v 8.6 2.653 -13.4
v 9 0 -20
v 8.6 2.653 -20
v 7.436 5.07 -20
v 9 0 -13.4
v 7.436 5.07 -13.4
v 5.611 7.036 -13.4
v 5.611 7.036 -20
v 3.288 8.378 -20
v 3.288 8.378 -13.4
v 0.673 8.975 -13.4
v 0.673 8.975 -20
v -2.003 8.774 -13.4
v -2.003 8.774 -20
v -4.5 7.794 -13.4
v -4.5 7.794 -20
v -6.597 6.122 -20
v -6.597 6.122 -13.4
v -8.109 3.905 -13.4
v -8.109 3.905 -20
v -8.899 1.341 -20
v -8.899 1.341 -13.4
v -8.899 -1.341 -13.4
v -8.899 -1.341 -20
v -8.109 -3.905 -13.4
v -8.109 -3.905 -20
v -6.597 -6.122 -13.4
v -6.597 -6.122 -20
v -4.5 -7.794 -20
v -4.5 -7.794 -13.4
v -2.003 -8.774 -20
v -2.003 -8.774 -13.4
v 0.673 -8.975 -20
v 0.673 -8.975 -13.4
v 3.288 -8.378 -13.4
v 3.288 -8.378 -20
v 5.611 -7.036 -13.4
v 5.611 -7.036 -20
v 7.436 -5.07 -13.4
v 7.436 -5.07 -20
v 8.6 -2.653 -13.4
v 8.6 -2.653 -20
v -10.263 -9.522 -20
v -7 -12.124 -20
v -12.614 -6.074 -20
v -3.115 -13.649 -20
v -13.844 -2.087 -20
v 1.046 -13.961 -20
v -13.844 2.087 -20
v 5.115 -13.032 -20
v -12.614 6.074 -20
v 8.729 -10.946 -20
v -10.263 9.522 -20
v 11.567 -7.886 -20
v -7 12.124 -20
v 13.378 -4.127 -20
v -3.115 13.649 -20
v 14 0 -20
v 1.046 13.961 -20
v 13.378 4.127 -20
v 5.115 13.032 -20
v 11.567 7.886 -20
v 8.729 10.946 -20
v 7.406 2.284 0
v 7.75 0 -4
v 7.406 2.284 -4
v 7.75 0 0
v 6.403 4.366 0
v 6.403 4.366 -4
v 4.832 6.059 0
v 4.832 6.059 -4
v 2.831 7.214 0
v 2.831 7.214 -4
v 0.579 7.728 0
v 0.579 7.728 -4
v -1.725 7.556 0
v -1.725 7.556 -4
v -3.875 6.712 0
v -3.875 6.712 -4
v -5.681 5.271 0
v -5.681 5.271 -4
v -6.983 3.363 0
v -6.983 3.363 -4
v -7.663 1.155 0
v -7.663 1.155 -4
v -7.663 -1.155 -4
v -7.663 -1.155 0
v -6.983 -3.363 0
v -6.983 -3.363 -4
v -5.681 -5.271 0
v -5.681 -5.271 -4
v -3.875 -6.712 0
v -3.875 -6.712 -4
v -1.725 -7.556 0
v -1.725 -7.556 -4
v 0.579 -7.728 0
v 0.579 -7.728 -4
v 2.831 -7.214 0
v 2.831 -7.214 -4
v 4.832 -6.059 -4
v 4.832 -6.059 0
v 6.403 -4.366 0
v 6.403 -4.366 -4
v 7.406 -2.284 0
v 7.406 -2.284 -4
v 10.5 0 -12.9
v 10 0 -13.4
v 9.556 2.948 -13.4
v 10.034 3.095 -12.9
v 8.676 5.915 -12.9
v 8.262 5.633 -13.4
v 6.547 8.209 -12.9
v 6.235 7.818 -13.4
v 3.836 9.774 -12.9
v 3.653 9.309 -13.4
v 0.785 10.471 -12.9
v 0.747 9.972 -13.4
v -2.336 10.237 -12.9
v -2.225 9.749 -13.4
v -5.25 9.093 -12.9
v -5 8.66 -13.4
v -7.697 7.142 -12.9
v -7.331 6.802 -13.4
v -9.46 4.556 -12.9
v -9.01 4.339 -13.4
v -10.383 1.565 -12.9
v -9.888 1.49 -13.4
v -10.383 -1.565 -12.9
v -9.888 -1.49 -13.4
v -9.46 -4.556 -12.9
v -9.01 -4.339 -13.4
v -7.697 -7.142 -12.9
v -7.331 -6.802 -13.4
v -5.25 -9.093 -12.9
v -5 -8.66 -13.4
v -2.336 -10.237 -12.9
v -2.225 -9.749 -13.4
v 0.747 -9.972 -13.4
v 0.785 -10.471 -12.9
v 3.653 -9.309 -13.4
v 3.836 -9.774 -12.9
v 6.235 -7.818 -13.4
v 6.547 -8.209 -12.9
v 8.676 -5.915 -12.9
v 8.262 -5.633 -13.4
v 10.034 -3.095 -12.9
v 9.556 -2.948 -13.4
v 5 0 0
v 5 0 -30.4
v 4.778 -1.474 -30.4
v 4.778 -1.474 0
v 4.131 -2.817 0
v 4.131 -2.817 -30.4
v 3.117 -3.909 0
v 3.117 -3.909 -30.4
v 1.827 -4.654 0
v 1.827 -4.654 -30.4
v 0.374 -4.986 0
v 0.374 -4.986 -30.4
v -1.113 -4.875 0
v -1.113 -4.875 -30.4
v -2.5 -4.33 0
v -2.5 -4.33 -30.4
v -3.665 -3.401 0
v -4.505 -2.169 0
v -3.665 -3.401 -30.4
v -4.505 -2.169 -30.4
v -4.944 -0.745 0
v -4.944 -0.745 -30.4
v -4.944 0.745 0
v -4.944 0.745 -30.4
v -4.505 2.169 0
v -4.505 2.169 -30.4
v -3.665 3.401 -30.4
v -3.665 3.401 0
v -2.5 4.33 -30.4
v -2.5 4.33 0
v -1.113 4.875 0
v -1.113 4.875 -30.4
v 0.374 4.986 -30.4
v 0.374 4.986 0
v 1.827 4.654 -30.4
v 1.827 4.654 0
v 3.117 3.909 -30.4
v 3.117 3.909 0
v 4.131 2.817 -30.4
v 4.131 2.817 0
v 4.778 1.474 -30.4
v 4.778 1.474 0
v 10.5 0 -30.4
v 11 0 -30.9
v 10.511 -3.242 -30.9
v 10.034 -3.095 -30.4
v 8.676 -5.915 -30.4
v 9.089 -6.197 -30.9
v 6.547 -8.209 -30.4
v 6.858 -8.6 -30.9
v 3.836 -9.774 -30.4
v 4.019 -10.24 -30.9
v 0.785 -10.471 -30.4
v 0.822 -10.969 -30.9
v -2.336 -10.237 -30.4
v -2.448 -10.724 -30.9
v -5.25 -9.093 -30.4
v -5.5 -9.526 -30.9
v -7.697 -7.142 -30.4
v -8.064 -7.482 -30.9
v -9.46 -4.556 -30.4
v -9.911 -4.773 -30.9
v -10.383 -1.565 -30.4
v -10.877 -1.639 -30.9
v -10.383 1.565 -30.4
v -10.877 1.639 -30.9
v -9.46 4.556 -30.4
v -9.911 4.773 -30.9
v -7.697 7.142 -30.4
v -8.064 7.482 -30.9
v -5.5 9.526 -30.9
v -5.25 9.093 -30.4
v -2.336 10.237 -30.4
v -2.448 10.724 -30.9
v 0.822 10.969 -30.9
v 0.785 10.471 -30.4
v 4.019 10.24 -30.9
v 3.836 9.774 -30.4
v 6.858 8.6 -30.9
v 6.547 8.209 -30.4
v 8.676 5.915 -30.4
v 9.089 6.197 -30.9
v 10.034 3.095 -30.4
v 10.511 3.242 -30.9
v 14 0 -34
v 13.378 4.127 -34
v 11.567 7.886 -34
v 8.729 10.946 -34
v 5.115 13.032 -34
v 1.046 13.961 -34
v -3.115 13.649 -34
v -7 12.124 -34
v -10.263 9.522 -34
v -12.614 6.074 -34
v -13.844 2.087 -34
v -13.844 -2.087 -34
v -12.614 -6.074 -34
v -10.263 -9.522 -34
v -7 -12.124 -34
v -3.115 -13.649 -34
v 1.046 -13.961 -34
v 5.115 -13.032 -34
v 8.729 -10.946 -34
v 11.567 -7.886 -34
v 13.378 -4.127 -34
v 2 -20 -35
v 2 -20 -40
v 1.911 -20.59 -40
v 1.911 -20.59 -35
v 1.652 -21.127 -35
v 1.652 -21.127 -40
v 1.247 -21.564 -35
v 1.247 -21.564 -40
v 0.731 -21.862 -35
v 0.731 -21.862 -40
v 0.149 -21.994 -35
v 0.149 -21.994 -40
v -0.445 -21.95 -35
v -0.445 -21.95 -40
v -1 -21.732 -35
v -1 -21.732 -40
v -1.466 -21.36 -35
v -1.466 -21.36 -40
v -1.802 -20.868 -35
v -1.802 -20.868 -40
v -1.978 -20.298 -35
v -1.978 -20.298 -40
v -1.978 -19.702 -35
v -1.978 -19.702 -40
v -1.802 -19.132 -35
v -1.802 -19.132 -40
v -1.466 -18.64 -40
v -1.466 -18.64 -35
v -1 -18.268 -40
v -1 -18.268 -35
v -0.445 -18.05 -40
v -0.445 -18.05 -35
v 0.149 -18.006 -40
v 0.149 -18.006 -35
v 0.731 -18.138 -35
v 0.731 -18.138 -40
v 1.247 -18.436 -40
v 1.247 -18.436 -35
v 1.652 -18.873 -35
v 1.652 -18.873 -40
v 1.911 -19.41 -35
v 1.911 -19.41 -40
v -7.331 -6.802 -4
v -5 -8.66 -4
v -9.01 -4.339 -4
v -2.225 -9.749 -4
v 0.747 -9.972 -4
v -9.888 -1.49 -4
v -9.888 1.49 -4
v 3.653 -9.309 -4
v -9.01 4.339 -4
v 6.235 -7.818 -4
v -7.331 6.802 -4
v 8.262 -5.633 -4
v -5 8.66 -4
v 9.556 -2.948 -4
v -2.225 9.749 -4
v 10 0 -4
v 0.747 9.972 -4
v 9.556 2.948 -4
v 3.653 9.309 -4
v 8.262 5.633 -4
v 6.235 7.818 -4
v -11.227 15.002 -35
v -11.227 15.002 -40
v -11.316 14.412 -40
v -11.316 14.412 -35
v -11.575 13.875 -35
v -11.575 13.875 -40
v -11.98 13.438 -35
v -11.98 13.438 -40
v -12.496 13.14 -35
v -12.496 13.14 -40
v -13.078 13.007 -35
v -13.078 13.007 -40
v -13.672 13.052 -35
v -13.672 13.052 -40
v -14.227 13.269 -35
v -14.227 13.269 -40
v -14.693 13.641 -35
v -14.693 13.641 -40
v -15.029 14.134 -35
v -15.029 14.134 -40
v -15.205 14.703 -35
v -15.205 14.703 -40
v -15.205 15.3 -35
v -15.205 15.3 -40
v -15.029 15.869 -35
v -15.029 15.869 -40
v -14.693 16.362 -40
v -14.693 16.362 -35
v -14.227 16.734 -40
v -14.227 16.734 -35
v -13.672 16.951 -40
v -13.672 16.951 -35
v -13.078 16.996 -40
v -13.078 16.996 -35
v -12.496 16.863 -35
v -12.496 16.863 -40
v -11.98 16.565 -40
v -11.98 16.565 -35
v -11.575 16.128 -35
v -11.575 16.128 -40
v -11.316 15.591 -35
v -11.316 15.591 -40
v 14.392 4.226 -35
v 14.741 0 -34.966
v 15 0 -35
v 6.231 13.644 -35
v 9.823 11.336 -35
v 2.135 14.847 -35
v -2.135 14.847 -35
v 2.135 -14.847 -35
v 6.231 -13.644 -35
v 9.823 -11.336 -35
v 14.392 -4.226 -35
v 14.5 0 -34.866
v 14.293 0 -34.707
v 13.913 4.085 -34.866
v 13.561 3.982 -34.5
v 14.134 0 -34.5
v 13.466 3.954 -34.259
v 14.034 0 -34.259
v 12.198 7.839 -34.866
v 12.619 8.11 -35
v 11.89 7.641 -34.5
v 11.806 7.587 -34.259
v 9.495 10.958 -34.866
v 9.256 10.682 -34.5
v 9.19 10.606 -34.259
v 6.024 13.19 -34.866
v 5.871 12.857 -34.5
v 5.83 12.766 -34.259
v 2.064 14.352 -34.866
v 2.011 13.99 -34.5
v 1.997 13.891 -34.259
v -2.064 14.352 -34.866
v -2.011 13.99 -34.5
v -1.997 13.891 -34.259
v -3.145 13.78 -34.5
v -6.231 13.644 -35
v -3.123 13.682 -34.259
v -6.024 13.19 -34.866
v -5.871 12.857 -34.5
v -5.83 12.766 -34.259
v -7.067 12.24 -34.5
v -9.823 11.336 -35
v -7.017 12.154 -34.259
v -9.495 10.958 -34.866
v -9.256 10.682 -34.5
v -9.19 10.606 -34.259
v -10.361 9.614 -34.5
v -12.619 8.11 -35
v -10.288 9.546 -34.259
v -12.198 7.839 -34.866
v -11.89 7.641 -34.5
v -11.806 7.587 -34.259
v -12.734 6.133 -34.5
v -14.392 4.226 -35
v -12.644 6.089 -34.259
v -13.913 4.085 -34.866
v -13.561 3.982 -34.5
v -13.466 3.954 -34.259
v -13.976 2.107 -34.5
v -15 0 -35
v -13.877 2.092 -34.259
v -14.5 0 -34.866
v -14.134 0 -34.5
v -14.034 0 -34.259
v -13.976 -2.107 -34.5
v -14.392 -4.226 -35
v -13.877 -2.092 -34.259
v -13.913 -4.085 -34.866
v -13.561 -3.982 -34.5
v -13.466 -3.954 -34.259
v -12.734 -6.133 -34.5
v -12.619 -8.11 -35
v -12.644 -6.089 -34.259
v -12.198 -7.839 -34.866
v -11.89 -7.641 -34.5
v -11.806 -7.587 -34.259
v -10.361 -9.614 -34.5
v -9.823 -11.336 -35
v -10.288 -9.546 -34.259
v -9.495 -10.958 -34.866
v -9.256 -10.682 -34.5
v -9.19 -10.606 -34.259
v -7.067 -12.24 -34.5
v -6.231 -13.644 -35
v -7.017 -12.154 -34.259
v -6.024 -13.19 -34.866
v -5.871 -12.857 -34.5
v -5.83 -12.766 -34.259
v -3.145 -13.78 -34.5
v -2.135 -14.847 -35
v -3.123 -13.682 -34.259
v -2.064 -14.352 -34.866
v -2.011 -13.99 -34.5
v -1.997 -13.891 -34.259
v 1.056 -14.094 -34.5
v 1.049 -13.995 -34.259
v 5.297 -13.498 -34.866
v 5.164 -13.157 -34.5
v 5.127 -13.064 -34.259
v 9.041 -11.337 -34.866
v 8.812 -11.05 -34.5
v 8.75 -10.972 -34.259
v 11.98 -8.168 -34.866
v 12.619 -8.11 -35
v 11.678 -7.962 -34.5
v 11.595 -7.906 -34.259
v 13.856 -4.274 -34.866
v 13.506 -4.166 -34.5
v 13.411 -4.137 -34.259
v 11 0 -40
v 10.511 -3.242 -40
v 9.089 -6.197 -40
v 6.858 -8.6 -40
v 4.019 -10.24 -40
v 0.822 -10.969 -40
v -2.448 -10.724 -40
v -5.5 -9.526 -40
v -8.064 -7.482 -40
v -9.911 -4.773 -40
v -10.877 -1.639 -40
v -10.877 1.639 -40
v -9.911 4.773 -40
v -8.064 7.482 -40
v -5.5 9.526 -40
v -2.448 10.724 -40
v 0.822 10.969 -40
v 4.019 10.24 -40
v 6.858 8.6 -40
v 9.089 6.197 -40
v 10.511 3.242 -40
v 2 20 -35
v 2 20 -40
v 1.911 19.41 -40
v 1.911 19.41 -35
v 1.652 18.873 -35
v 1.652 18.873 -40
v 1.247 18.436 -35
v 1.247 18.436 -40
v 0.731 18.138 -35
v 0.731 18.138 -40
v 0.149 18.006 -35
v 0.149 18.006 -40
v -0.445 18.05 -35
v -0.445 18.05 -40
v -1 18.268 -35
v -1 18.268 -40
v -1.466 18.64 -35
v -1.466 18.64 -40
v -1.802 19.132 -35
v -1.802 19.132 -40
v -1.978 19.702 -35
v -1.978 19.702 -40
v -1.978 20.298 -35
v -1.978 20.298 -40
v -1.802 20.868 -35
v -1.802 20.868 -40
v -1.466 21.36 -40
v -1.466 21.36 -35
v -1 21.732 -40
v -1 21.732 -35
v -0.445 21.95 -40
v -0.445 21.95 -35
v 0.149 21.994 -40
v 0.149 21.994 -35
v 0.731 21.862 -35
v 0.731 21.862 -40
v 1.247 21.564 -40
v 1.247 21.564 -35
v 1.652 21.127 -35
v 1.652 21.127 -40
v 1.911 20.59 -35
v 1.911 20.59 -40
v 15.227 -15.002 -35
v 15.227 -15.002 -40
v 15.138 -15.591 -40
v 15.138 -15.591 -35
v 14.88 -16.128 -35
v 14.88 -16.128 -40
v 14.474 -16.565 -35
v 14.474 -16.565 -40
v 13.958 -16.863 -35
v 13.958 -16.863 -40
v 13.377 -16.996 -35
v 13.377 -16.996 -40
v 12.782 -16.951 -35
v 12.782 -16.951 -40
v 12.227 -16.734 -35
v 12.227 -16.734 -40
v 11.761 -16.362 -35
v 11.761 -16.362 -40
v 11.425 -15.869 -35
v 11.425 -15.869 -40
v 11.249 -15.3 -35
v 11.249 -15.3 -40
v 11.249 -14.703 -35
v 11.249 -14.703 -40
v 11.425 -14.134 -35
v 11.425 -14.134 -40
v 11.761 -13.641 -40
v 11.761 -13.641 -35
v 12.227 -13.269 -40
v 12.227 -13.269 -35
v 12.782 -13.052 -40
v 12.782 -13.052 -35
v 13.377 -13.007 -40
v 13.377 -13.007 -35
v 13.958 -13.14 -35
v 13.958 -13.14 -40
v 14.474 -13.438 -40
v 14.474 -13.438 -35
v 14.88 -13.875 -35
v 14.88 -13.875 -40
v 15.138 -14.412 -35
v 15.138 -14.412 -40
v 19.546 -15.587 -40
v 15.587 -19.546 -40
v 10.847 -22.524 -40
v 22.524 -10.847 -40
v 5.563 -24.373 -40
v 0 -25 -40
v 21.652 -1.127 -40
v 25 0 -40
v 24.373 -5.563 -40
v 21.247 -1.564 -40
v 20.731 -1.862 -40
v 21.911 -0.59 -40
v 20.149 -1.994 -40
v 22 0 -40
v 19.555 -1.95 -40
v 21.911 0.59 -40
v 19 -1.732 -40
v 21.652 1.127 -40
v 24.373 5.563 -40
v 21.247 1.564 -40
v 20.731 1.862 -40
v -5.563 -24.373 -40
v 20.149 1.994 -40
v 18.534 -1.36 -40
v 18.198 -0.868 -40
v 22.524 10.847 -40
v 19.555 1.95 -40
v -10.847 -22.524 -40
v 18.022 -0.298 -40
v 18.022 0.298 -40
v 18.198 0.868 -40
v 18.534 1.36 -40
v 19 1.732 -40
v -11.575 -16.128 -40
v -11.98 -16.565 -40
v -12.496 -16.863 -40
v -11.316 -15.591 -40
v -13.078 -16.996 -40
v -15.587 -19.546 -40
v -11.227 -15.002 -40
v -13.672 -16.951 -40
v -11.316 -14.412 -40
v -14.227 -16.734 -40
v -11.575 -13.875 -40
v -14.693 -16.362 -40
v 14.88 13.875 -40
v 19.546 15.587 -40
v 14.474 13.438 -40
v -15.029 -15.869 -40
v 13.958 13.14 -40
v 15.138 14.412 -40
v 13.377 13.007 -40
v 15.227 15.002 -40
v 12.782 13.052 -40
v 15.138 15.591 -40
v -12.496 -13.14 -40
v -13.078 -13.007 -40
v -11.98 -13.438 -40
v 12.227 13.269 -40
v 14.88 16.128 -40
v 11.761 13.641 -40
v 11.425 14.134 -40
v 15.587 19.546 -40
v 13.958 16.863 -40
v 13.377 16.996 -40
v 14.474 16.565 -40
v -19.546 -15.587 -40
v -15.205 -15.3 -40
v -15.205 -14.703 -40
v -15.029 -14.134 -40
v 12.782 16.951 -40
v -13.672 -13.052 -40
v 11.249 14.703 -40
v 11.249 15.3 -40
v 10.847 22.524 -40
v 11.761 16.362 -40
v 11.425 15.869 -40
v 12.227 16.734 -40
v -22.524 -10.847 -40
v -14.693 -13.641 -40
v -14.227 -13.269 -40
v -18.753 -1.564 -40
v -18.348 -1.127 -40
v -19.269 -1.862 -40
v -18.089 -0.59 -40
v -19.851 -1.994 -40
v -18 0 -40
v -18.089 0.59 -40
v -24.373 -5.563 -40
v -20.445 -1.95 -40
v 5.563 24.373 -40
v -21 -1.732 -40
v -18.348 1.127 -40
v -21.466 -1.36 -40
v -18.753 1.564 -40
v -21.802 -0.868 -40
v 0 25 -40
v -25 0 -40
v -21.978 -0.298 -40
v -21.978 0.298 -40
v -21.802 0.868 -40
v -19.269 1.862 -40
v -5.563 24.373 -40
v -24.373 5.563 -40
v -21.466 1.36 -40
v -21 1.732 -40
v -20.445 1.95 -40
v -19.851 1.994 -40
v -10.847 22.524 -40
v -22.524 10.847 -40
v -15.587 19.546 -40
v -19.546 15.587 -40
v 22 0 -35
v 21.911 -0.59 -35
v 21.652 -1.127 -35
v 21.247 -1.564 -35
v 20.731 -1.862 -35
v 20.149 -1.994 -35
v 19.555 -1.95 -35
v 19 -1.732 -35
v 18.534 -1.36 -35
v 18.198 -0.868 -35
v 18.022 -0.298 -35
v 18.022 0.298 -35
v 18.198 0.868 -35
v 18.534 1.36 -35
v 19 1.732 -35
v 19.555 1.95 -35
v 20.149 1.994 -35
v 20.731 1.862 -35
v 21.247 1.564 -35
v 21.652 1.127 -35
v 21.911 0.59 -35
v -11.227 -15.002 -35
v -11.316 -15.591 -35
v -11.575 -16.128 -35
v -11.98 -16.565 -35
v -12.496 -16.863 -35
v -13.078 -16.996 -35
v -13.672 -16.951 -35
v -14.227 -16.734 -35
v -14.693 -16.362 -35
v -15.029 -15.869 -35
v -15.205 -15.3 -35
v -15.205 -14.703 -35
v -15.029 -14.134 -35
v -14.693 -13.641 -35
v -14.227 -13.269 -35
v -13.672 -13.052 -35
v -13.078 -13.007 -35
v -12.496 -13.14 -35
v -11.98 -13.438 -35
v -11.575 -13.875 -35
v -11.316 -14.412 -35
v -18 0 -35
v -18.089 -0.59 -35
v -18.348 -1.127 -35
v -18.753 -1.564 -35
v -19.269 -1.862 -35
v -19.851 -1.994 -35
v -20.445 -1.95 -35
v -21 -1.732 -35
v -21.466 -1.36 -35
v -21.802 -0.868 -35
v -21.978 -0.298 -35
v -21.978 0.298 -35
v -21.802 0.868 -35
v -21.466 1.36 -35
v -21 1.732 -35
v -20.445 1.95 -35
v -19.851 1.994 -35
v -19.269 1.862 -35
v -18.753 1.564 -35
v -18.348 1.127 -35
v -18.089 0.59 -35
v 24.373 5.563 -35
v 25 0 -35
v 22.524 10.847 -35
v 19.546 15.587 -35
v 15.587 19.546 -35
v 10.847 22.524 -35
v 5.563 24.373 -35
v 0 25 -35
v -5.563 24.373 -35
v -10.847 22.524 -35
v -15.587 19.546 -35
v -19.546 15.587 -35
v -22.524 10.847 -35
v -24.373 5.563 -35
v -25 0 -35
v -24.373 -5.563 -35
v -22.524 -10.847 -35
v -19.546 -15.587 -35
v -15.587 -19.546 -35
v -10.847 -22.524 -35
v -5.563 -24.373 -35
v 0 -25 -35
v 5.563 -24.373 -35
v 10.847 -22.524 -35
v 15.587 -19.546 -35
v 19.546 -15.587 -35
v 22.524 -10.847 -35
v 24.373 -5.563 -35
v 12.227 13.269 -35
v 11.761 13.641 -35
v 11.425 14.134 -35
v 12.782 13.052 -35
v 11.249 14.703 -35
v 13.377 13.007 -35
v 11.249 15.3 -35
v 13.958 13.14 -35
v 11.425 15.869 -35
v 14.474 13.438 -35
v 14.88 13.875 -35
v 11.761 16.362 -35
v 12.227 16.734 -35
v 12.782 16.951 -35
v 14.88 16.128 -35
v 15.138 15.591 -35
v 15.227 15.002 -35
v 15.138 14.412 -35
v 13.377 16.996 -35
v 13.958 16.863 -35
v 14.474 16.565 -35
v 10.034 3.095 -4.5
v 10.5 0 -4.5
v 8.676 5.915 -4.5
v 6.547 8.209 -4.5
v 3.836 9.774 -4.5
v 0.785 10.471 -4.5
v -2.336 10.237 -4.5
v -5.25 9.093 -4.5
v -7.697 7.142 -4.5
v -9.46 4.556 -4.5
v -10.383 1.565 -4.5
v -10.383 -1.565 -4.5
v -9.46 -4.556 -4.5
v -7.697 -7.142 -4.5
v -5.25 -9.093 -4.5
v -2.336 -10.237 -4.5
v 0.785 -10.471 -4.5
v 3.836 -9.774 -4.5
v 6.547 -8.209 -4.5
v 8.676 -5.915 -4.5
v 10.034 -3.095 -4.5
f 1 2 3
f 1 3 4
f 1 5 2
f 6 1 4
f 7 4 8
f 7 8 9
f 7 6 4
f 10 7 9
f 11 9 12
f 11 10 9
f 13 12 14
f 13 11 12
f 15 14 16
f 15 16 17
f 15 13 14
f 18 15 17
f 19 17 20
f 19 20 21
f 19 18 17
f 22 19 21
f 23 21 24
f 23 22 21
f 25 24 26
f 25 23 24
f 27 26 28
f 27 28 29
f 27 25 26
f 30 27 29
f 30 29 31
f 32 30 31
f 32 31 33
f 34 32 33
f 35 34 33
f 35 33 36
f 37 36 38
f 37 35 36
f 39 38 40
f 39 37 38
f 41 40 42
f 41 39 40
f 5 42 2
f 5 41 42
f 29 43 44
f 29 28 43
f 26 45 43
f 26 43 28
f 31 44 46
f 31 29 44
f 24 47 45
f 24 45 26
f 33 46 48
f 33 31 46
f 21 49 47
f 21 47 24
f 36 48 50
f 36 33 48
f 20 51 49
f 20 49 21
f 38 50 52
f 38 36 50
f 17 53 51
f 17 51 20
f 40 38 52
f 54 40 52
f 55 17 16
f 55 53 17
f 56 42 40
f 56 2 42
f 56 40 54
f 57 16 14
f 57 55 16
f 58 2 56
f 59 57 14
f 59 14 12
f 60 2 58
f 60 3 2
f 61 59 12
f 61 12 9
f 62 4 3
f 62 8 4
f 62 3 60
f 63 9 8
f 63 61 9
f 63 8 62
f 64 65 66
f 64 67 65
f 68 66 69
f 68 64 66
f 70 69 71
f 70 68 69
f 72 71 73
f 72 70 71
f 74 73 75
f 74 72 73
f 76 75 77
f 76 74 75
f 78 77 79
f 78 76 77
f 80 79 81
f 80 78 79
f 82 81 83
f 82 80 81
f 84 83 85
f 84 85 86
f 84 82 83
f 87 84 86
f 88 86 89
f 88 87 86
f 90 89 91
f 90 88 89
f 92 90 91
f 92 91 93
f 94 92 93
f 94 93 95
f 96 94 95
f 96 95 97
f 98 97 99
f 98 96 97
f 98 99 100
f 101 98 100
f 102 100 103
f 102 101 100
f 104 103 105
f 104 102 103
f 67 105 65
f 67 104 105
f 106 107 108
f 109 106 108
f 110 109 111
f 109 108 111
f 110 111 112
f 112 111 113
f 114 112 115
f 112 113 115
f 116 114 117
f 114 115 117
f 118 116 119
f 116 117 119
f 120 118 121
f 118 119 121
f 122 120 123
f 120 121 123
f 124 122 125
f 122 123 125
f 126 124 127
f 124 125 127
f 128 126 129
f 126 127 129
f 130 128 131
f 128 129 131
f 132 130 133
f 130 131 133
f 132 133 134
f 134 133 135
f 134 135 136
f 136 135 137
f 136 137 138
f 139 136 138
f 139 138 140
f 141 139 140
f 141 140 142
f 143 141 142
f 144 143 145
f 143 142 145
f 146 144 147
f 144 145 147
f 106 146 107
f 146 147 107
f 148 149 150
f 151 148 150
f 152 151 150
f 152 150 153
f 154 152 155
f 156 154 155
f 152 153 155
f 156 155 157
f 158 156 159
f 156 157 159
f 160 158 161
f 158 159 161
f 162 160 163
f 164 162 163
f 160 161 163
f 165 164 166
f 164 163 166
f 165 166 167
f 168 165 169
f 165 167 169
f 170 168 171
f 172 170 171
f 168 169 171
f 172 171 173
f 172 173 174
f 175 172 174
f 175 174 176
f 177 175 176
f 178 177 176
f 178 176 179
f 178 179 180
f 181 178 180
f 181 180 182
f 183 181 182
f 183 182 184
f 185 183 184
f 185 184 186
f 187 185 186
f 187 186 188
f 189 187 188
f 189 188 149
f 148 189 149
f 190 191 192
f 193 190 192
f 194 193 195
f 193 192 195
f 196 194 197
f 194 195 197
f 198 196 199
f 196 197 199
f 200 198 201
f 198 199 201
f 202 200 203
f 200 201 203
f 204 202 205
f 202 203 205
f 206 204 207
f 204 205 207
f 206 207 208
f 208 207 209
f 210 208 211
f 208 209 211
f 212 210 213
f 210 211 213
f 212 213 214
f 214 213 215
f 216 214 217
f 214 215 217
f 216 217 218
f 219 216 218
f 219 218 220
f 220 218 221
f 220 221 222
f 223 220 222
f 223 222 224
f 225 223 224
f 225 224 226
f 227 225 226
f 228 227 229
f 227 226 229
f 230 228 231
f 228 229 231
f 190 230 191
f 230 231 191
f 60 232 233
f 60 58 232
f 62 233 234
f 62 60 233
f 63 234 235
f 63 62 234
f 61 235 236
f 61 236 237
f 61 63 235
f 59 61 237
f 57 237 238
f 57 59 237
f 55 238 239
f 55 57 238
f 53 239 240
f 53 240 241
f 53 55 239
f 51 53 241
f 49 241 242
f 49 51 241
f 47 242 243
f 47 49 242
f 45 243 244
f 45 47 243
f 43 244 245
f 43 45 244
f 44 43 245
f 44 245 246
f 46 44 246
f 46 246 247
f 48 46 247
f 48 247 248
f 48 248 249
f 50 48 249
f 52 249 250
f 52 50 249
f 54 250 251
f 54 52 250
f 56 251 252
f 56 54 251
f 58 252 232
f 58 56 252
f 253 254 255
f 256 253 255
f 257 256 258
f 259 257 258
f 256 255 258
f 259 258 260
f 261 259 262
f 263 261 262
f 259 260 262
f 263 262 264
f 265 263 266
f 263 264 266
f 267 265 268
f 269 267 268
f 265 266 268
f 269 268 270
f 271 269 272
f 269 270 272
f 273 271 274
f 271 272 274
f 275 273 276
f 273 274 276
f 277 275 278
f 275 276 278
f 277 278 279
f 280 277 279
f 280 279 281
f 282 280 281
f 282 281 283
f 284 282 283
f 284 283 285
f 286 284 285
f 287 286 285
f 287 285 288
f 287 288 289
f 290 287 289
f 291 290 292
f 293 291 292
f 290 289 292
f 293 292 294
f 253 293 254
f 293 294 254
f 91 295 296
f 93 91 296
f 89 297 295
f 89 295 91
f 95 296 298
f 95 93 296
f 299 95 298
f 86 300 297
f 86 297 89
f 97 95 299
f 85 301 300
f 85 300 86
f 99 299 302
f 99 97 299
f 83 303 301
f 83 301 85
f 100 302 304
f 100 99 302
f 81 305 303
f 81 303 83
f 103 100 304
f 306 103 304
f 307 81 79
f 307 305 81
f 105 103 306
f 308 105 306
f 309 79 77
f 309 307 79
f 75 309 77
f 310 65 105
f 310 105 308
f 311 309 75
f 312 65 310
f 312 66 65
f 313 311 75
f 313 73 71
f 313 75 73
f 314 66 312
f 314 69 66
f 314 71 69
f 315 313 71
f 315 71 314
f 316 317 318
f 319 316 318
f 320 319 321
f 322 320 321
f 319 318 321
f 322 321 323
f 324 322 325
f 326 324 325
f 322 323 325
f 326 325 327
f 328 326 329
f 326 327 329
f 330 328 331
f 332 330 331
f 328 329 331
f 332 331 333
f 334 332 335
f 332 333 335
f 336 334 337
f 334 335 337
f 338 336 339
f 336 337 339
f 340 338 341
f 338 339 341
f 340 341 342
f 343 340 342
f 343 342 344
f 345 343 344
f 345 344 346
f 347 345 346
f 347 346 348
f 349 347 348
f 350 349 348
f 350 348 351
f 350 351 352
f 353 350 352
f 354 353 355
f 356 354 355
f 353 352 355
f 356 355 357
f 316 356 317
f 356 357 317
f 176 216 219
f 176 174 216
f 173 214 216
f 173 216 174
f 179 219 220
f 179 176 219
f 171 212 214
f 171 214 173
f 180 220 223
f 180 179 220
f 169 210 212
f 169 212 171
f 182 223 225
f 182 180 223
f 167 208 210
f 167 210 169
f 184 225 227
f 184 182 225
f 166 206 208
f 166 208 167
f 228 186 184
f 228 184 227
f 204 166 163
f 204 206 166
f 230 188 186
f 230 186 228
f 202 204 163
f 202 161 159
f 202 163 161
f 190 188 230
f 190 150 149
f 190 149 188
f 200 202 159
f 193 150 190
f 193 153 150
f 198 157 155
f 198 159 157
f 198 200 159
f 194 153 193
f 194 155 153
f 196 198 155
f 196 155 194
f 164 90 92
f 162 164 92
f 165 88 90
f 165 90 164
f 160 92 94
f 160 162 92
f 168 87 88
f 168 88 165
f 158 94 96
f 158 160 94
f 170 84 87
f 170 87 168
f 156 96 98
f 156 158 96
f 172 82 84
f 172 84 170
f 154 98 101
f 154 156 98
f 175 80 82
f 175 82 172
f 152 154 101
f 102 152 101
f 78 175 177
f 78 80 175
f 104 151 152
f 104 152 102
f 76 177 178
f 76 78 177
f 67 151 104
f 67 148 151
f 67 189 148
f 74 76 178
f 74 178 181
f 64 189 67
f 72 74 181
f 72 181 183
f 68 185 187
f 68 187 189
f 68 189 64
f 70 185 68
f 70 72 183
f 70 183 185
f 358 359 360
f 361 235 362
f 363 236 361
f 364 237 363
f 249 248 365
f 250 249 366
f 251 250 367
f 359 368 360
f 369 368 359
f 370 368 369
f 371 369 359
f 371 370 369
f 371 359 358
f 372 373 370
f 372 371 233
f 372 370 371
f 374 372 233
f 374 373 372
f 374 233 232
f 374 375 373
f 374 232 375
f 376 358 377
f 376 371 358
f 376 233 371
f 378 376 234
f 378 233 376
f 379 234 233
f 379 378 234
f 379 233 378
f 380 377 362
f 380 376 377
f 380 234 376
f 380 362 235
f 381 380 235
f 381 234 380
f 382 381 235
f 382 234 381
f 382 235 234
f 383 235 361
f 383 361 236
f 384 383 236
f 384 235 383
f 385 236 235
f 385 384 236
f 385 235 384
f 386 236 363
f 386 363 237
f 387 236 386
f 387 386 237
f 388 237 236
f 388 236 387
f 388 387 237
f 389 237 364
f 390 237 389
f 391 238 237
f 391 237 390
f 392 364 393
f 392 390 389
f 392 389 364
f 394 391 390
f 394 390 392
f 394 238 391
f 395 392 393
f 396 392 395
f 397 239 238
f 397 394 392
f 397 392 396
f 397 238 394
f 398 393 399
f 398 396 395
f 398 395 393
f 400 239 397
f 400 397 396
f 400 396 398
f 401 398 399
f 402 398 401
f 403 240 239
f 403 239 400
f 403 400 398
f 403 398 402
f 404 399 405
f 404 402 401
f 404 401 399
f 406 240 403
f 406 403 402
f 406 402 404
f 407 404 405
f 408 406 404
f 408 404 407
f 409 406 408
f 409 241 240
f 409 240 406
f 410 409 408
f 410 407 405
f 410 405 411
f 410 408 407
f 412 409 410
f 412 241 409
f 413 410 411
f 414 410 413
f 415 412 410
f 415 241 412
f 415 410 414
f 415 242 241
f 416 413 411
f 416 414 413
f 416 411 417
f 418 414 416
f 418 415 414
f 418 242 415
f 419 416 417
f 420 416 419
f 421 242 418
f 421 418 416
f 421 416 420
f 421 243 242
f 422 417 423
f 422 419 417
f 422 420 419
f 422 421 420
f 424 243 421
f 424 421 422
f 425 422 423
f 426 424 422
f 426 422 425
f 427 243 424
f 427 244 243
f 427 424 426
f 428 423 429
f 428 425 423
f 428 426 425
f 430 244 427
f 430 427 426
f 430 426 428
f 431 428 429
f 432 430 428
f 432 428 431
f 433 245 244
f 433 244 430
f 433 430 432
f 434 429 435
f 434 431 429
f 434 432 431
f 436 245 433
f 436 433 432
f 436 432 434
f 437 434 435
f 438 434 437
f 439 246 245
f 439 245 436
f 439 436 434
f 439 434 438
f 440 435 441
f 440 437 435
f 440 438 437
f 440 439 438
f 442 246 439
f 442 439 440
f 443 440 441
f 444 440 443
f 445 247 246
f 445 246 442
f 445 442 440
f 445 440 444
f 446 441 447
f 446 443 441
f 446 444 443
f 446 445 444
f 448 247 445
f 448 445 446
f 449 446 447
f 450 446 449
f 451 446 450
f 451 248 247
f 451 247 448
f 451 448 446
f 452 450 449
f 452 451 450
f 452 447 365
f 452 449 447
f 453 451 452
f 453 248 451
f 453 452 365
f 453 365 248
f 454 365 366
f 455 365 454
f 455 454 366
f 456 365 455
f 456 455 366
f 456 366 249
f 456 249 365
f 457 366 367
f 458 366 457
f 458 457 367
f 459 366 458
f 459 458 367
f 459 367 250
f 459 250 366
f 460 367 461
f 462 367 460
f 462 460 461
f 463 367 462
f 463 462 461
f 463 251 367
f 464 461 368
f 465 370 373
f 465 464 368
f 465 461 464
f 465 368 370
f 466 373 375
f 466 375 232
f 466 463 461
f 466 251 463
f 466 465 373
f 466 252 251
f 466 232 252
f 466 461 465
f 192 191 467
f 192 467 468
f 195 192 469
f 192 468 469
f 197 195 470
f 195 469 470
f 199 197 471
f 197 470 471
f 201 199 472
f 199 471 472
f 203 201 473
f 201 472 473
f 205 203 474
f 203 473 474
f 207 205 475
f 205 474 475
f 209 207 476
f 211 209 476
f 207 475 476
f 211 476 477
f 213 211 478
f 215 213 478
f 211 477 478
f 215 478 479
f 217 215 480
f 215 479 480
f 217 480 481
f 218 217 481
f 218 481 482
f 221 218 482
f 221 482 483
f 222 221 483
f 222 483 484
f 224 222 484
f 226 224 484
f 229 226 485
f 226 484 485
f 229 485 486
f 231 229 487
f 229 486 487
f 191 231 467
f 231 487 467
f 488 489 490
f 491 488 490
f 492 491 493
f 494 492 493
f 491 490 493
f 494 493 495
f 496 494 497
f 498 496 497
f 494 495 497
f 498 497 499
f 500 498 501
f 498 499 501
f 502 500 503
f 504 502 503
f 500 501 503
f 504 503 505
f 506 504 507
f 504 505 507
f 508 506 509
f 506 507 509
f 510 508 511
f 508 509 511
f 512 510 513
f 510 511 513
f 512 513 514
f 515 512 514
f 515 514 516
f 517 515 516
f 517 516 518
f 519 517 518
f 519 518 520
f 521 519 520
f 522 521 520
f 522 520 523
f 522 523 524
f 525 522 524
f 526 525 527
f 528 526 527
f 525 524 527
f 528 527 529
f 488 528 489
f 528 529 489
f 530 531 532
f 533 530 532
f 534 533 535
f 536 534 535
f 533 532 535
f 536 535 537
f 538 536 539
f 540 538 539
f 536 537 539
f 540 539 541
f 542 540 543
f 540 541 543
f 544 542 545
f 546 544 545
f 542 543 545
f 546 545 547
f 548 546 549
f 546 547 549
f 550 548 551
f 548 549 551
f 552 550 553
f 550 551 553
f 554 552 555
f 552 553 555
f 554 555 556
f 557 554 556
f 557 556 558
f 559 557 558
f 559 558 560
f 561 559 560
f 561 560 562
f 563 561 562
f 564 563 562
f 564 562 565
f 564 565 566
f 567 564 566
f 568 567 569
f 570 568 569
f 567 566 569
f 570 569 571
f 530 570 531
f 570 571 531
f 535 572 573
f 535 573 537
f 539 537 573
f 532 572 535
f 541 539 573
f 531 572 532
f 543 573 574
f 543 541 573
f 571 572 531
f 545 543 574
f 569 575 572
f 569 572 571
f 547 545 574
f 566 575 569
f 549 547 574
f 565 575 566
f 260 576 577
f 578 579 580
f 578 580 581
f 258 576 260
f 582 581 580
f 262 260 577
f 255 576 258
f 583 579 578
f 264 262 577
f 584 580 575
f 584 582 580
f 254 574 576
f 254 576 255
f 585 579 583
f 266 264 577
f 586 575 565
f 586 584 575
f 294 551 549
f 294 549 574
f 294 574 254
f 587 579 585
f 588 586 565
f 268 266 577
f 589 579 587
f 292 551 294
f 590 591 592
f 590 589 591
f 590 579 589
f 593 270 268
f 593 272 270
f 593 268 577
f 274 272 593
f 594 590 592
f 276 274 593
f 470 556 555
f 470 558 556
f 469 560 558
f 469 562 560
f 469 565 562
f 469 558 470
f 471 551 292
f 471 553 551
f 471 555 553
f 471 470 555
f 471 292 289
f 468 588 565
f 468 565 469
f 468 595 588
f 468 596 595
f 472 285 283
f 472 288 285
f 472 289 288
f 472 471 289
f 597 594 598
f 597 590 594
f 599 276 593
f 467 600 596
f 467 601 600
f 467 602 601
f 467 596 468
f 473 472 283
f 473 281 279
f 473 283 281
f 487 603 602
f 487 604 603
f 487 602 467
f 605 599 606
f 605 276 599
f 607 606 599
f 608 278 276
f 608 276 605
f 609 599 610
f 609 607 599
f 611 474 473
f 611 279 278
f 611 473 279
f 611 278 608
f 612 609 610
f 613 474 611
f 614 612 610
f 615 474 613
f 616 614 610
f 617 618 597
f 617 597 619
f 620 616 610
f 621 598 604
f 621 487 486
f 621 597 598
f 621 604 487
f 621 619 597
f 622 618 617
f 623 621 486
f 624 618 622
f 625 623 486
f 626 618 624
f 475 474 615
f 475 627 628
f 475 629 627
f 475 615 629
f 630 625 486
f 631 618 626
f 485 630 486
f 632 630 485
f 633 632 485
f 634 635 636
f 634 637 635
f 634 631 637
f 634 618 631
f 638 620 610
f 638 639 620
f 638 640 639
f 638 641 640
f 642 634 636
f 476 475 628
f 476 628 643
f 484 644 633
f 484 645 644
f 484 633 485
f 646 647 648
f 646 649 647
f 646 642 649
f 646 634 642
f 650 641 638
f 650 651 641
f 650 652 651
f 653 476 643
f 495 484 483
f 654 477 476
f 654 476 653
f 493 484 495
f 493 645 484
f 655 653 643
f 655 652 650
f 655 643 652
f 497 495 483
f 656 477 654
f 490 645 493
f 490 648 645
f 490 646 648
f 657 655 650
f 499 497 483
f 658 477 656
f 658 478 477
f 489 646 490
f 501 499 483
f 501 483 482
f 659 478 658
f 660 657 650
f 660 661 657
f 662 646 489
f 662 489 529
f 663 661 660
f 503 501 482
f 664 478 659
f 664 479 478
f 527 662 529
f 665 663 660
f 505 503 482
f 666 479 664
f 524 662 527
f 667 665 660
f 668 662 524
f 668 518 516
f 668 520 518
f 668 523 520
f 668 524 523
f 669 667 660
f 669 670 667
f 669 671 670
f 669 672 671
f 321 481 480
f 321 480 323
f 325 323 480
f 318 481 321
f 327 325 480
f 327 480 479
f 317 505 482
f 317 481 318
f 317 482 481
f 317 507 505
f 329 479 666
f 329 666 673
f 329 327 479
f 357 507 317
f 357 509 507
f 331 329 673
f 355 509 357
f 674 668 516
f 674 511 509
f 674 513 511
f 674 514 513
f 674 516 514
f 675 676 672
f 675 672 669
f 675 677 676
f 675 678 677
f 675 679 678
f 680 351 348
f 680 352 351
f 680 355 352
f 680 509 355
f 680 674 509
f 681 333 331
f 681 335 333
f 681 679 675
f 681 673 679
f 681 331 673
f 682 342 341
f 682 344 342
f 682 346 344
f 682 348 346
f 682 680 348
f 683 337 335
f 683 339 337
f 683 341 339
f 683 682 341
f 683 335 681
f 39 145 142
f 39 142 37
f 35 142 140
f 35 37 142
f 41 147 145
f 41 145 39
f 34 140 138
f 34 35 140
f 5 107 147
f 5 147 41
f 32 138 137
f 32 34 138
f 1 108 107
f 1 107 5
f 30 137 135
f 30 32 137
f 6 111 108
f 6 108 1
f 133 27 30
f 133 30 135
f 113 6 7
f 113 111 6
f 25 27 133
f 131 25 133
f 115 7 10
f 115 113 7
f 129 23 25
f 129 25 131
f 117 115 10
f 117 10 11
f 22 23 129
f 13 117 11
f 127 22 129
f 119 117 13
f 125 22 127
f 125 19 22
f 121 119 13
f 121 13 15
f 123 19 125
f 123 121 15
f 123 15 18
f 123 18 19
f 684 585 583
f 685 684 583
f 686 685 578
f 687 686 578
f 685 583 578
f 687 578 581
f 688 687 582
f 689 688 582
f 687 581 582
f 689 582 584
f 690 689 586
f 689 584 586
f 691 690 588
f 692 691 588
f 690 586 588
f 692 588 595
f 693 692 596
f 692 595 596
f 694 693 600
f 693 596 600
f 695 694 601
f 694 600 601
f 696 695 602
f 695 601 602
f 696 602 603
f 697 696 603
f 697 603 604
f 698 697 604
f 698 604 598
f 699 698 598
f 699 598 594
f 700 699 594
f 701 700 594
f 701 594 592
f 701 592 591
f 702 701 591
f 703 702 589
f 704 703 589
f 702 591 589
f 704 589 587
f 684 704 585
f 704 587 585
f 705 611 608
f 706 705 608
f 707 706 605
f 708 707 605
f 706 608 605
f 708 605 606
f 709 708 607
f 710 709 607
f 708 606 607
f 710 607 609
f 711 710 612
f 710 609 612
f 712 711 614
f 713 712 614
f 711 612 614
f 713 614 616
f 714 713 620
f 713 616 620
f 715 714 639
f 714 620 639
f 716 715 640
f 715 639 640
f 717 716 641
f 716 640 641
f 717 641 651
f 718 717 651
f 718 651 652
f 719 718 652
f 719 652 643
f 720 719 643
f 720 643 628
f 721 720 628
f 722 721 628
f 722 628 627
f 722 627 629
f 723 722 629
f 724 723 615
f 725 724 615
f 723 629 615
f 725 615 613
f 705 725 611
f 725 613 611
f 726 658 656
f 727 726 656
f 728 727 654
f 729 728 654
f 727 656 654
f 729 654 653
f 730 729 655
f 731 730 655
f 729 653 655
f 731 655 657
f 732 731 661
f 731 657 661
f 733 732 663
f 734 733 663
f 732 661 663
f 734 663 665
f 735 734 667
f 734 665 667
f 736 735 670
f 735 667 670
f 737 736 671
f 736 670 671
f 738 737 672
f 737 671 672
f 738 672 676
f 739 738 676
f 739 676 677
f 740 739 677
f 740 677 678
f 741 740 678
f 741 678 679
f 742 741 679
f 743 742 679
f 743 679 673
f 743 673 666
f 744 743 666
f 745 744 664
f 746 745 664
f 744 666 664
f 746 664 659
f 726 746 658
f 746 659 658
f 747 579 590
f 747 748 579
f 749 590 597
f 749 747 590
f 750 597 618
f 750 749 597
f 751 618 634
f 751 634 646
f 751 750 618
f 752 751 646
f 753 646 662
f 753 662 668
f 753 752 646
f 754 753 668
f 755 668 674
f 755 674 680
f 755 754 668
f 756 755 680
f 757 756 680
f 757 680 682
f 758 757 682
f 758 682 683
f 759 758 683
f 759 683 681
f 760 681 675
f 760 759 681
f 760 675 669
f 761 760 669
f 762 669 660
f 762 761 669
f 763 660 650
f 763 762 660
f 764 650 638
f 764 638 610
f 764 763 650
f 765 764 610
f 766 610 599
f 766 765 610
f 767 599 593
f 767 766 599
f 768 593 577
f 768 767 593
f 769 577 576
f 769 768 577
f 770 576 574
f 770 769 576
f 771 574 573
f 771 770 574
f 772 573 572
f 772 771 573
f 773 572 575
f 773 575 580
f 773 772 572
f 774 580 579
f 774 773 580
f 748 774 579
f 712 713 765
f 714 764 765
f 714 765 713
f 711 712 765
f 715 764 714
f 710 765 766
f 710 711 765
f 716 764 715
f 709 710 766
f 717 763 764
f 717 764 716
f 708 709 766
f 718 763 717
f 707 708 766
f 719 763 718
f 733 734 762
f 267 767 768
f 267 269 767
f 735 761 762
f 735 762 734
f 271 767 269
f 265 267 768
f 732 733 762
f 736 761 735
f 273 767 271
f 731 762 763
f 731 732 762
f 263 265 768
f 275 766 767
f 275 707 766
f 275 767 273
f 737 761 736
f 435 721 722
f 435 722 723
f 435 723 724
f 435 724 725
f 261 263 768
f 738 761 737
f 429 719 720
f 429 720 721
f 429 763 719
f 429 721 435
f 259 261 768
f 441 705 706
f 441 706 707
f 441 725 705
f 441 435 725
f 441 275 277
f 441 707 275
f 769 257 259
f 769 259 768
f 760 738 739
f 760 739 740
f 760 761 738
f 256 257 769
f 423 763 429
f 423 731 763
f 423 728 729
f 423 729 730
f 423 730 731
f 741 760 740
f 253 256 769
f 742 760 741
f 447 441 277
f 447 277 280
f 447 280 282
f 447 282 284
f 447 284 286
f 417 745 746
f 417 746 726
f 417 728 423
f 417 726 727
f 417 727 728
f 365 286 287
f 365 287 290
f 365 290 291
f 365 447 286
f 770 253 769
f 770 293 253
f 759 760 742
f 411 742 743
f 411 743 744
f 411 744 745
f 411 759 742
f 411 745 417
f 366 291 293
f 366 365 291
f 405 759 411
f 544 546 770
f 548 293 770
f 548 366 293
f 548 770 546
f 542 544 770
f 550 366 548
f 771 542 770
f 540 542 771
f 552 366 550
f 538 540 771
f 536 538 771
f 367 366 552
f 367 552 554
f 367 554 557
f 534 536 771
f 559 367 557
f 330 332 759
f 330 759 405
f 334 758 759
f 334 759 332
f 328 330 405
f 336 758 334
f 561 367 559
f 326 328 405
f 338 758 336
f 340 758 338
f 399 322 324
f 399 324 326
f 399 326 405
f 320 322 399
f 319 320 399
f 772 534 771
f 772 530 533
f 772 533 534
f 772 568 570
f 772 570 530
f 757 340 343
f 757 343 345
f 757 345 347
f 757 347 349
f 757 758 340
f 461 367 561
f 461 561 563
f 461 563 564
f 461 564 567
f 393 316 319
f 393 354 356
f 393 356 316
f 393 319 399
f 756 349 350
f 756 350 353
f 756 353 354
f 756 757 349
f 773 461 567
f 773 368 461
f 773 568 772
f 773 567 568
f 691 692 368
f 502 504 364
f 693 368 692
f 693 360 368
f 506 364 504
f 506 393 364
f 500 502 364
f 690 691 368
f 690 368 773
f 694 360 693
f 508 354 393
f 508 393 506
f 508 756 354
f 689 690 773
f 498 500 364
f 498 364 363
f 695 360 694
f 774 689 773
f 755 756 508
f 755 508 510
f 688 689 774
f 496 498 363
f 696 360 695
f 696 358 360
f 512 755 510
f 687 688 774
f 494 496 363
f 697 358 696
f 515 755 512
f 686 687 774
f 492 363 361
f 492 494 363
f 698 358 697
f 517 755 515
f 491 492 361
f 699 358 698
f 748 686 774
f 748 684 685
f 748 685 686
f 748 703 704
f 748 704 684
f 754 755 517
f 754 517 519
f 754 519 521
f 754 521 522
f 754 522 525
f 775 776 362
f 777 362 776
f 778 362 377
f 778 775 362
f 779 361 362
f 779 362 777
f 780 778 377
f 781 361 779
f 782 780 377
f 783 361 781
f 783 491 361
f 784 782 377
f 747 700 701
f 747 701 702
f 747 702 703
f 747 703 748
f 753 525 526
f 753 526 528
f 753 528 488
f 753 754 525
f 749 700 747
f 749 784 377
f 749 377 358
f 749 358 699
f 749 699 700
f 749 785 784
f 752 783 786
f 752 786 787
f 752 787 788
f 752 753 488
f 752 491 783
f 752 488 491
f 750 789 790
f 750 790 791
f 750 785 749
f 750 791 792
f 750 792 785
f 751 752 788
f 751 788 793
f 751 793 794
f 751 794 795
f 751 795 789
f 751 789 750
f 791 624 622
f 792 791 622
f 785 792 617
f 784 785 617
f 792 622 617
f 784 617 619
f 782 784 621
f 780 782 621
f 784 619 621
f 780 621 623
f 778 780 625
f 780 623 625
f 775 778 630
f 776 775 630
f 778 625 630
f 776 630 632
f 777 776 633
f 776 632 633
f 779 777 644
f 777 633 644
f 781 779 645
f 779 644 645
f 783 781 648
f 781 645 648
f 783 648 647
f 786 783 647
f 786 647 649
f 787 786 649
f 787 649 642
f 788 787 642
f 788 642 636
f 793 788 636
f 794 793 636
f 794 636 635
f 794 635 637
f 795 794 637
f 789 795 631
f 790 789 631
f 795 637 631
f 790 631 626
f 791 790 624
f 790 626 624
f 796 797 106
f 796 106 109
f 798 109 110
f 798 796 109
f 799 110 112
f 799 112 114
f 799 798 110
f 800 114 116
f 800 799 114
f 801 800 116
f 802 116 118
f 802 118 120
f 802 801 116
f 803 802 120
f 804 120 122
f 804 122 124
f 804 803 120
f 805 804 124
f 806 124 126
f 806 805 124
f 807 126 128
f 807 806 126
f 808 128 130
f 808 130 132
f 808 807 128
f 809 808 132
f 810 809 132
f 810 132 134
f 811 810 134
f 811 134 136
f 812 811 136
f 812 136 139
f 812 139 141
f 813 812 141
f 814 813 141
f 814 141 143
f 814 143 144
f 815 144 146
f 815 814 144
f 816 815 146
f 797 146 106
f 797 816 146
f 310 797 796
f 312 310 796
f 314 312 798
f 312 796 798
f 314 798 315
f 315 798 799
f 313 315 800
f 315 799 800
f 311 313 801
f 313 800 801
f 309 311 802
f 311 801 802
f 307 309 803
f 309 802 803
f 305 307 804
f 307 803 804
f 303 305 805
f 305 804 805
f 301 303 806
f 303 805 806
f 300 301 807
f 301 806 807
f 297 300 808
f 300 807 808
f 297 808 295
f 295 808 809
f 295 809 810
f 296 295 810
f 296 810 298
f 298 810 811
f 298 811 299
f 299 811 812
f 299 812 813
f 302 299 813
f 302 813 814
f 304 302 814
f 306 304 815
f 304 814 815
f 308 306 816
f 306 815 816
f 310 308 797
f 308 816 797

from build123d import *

# Parameters (mm, degrees)
F2_R     = 5
F3_DEPTH = 40
F2_R_2   = 11
F4_DEPTH = 9.6
F2_R_3   = 2
F5_DEPTH = 5
F6_SIZE  = 0.5


with BuildPart() as f1:
    # F0 (on Front) → F1 (revolve)
    with BuildSketch(Plane.XZ):
        with BuildLine():
            Line((7.75, 0), (0, 0))
            Line((0, 0), (0, -40))
            Line((0, -40), (25, -40))
            Line((25, -40), (25, -35))
            Line((25, -35), (15, -35))
            ThreePointArc((15, -35), (14.292893, -34.707107), (14, -34))
            Line((14, -34), (14, -20))
            Line((14, -20), (9, -20))
            Line((9, -20), (9, -13.4))
            Line((9, -13.4), (10.5, -13.4))
            Line((10.5, -13.4), (10.5, -4))
            Line((10.5, -4), (7.75, -4))
            Line((7.75, -4), (7.75, 0))
        make_face()
    revolve(axis=Axis((0, 0, -20), (0, 0, 1)))

    # F2 (on face) → F3 (cut)
    with BuildSketch(Plane(origin=(0, 0, -40), x_dir=(1, 0, 0), z_dir=(0, 0, -1))):
        Circle(F2_R)
    extrude(amount=-F3_DEPTH, mode=Mode.SUBTRACT)

    # F2 (on face) → F4 (cut)
    with BuildSketch(Plane(origin=(0, 0, -40), x_dir=(1, 0, 0), z_dir=(0, 0, -1))):
        Circle(F2_R_2)
        Circle(F2_R, mode=Mode.SUBTRACT)
    extrude(amount=-F4_DEPTH, mode=Mode.SUBTRACT)

    # F2 (on face) → F5 (cut)
    with BuildSketch(Plane(origin=(0, 0, -40), x_dir=(1, 0, 0), z_dir=(0, 0, -1))):
        with Locations((-13.227044, 15.00151)):
            Circle(F2_R_3)
        with Locations((0, 20)):
            Circle(F2_R_3)
        with Locations((13.227044, 15.00151)):
            Circle(F2_R_3)
        with Locations((20, 0)):
            Circle(F2_R_3)
        with Locations((13.227044, -15.00151)):
            Circle(F2_R_3)
        with Locations((0, -20)):
            Circle(F2_R_3)
        with Locations((-13.227044, -15.00151)):
            Circle(F2_R_3)
        with Locations((-20, 0)):
            Circle(F2_R_3)
    extrude(amount=-F5_DEPTH, mode=Mode.SUBTRACT)

    # F6
    f6_edges = [f1.edges().sort_by_distance(p)[0] for p in [
        (-10.5, 0, -13.4),
        (-10.5, 0, -4),
        (-11, 0, -30.4),
    ]]
    chamfer(f6_edges, length=F6_SIZE)


solid = f1.part
